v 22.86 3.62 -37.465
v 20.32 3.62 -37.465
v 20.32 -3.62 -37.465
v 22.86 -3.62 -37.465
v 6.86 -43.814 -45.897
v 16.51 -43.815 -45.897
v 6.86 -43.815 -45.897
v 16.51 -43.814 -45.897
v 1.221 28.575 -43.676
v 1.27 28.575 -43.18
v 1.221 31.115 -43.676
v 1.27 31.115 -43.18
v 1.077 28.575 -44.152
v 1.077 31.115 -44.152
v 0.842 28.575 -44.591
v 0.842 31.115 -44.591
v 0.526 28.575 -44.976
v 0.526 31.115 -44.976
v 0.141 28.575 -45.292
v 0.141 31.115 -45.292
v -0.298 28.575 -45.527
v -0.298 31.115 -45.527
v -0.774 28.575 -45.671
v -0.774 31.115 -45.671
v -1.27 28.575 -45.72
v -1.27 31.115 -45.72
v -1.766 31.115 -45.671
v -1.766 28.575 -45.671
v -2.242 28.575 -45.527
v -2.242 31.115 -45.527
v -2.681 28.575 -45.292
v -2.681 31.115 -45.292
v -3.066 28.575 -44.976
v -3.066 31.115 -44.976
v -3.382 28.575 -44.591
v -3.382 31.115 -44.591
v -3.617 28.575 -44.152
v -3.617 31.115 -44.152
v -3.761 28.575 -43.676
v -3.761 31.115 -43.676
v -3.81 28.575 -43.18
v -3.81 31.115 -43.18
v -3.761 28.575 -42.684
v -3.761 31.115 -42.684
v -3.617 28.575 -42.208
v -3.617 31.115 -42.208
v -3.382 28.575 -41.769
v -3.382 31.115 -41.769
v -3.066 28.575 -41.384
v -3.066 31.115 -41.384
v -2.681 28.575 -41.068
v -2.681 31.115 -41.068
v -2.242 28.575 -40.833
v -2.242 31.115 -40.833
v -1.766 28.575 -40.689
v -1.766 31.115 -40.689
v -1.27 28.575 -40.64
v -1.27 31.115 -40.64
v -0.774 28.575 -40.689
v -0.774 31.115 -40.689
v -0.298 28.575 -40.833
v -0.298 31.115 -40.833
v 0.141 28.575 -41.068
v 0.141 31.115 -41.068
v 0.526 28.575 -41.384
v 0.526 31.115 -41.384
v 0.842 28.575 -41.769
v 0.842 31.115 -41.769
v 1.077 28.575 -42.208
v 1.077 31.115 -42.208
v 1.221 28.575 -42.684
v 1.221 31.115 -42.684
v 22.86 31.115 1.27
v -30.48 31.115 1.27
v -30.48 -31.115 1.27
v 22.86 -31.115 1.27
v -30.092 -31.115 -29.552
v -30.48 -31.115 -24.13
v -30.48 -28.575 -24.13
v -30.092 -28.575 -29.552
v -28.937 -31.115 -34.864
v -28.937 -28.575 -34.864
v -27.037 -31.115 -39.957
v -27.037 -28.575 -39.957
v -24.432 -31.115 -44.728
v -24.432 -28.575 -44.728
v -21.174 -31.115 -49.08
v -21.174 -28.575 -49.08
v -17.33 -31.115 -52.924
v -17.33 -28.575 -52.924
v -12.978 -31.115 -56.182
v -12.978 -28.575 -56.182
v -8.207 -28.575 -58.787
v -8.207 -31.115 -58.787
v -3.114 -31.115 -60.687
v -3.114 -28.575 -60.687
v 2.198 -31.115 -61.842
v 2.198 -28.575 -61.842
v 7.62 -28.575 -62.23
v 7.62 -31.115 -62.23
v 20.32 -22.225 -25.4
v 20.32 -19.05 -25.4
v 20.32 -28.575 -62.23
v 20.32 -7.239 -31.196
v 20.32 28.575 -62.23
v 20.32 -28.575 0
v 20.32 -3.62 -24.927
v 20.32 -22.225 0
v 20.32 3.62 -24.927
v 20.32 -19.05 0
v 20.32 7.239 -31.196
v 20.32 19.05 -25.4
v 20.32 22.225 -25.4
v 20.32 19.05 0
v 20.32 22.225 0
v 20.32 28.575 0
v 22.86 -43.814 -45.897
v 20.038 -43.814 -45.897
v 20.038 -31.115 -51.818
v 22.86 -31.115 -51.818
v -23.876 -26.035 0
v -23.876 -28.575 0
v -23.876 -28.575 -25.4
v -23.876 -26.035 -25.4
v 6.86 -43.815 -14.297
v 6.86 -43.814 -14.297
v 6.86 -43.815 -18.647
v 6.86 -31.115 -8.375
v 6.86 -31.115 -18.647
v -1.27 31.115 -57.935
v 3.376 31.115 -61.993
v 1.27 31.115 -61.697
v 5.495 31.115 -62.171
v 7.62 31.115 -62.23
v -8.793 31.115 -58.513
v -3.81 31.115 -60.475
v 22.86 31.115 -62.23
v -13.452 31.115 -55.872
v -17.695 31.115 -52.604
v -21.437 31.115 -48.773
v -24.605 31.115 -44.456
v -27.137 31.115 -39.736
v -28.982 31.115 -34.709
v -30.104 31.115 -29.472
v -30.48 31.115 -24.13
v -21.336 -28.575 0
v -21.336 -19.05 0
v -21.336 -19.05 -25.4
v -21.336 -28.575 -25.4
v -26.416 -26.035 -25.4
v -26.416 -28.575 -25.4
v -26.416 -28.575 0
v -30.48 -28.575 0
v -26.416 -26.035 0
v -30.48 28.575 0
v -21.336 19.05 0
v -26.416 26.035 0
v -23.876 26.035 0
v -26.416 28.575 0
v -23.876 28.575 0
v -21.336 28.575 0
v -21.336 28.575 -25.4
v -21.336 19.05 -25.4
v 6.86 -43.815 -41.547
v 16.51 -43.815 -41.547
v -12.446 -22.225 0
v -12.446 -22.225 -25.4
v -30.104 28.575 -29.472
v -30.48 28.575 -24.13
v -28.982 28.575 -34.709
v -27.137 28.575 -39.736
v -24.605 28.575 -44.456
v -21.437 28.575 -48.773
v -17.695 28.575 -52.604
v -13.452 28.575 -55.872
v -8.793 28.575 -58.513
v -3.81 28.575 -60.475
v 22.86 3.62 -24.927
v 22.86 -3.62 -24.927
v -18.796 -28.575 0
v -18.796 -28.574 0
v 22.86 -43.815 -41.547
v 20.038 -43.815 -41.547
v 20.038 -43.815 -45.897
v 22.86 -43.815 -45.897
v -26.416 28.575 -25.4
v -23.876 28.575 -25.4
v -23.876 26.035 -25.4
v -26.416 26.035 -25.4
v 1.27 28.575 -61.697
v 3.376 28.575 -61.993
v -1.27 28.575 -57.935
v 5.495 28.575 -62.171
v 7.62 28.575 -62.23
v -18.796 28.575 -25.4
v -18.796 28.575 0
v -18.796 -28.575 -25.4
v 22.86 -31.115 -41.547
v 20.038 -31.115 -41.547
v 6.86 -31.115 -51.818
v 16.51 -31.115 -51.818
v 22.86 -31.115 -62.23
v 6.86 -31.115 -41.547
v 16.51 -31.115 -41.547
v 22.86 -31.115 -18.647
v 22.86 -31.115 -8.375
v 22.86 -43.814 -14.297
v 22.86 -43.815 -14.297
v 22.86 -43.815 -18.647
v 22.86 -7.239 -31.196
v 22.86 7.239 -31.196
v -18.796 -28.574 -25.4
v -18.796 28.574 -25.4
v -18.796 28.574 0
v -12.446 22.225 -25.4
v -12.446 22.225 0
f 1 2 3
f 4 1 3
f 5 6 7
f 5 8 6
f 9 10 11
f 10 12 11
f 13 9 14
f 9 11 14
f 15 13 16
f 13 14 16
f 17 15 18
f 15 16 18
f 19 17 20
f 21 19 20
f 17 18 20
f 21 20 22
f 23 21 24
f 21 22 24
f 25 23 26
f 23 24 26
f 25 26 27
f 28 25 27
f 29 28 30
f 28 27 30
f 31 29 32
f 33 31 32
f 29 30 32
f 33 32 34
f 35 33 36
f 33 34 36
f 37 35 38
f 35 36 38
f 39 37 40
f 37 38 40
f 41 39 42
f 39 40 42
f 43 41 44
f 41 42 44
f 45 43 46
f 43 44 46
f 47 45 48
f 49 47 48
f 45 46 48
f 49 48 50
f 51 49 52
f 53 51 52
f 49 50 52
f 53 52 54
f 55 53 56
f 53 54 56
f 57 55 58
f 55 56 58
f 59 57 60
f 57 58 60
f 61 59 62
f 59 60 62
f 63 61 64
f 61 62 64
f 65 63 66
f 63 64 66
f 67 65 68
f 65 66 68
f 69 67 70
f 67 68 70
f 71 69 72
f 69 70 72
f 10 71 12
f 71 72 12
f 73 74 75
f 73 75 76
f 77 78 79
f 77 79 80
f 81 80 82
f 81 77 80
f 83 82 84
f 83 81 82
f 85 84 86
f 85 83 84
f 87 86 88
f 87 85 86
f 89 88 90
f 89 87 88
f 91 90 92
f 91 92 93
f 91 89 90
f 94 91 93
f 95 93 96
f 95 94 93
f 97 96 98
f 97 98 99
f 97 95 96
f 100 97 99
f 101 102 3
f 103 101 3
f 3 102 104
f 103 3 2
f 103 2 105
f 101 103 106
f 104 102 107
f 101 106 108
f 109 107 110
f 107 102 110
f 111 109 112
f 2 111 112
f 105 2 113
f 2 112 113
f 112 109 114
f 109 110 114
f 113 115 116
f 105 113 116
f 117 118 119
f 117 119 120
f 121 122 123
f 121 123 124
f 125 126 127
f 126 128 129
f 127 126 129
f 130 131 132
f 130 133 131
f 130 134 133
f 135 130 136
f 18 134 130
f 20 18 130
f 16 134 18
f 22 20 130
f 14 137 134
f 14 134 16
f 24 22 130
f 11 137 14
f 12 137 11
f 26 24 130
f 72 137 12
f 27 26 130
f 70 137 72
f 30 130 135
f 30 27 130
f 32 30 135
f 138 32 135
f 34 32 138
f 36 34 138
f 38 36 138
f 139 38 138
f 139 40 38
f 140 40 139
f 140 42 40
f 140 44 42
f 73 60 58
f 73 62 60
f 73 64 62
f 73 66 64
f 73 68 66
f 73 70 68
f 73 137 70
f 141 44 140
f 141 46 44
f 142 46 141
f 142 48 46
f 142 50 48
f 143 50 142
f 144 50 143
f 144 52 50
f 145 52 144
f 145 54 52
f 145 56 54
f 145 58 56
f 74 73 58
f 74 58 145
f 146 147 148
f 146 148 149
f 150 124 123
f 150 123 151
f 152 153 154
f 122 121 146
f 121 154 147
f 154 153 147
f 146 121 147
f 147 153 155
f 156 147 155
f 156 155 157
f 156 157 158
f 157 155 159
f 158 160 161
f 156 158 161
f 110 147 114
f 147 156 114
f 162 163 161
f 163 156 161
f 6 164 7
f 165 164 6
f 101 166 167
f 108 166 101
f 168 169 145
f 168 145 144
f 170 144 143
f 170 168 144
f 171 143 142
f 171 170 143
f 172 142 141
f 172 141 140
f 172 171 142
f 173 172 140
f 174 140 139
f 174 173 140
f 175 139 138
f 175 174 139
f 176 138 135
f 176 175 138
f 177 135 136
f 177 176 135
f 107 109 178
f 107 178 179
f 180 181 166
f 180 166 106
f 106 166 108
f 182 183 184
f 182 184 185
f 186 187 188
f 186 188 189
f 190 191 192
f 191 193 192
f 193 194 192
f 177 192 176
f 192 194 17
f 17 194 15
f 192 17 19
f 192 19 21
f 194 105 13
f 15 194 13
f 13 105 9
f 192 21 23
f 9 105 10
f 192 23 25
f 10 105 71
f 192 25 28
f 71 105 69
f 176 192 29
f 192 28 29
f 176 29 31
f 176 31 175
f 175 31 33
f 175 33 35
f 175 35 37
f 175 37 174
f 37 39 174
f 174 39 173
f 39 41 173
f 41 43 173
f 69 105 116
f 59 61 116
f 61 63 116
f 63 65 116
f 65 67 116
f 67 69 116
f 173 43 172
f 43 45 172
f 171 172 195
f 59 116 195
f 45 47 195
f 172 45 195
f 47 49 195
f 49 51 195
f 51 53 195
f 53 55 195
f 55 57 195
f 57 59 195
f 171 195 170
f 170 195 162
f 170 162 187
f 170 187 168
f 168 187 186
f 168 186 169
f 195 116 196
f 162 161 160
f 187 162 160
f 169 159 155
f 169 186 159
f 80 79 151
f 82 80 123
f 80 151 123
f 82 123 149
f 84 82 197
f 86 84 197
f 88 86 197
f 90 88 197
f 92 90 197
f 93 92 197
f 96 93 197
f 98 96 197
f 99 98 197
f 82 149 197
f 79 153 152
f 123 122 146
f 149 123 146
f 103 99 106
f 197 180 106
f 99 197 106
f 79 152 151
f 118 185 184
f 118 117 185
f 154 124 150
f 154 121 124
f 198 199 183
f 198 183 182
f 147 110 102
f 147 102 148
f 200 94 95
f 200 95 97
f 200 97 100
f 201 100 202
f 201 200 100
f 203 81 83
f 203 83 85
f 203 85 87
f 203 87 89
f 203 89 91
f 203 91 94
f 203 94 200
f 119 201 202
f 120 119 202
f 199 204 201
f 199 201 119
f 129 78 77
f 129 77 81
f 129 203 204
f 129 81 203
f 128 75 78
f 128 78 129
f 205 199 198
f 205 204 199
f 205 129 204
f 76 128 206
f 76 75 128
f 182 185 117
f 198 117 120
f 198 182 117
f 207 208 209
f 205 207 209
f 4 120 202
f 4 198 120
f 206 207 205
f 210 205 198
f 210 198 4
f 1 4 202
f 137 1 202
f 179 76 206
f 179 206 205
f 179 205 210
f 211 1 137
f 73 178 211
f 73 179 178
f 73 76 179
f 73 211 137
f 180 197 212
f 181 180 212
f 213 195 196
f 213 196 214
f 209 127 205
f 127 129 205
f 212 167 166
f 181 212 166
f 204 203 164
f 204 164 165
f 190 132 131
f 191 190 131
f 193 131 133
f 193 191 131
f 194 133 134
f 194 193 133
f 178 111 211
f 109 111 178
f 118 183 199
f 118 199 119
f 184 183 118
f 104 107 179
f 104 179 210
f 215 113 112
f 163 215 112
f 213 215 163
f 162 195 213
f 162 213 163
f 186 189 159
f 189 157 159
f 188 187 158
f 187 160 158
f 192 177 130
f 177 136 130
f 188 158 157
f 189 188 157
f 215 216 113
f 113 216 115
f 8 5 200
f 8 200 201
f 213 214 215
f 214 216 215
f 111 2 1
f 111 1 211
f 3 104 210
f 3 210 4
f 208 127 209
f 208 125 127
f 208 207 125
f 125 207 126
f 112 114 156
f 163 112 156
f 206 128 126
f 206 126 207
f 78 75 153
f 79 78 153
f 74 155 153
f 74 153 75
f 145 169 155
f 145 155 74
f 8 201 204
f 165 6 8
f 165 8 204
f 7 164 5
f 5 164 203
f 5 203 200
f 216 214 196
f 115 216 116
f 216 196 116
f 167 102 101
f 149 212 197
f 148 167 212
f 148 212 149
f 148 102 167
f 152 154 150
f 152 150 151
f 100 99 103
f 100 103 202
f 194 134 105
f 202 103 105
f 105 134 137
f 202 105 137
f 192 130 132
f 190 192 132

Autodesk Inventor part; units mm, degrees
ref_plane "YZ Plane" through (0, 0, 0) normal (1, 0, 0) x (0, 1, 0)
ref_plane "XZ Plane" through (0, 0, 0) normal (0, 1, 0) x (-1, 0, 0)
ref_plane "XY Plane" through (0, 0, 0) normal (0, 0, 1) x (1, 0, 0)
sketch "Sketch1" plane through (0, 0, 0) normal (0, 0, 1) x (1, 0, 0)
  line L0 (-30.48, 28.575) -> (20.32, 28.575)
  line L1 (20.32, 28.575) -> (20.32, -28.575)
  line L2 (20.32, -28.575) -> (-30.48, -28.575)
  line L3 (-30.48, -28.575) -> (-30.48, 28.575)
  line L4 (-25.4, 28.575) -> (25.4, -28.575) construction
  line L5 (25.4, 28.575) -> (-25.4, -28.575) construction
  line L6 (0, 0) -> (0, -19.5531)
  dimension "d0" = 50.8
  dimension "d1" = 57.15
  dimension "d2" = 20.32
  dimension "d3" = 0
extrude "Extrusion1" add sketch "Sketch1" along normal blind 1.27
sketch "Sketch2" plane through (0, 0, 1.27) normal (0, 0, 1) x (1, 0, 0)
  line L0 (-30.48, -28.575) -> (20.32, -28.575) projected
  line L1 (20.32, -28.575) -> (20.32, 28.575) projected
  line L2 (20.32, 28.575) -> (-30.48, 28.575) projected
  line L3 (-30.48, 28.575) -> (-30.48, -28.575) projected
  line L4 (20.32, 28.575) -> (-30.48, 28.575) projected
  line L5 (-30.48, -28.575) -> (20.32, -28.575) projected
  line L6 (20.32, 28.575) -> (-30.48, 28.575)
  line L7 (-30.48, 28.575) -> (-30.48, -28.575)
  line L8 (-30.48, -28.575) -> (20.32, -28.575)
  line L9 (20.32, -28.575) -> (20.32, 28.575)
  line L10 (22.86, 31.115) -> (-30.48, 31.115)
  line L11 (-30.48, -31.115) -> (22.86, -31.115)
  line L12 (22.86, -31.115) -> (22.86, 31.115)
  line L13 (-30.48, 31.115) -> (-30.48, 28.575)
  line L14 (-30.48, 28.575) -> (-30.48, -28.575) projected
  line L15 (-30.48, -28.575) -> (-30.48, -31.115)
  point P0 (0, 0)
  point P1 (-30.48, 28.575)
  dimension "d6" = 2.54
  dimension "d7" = 2.54
  dimension "d8" = 2.54
extrude "Extrusion2" add sketch "Sketch2" against normal blind 63.5 contours L0 L1 L2 L13 L10 L12 L11 L15
fillet "Fillet1" radius 38.1 2 edges at (-30.48, -29.845, -62.23) (-30.48, 29.845, -62.23)
sketch "Sketch3" plane through (0, 0, 0) normal (0, 0, -1) x (-1, 0, 0)
  line L0 (30.48, -28.575) -> (-20.32, -28.575) projected
  line L1 (30.48, 28.575) -> (30.48, -28.575) projected
  line L2 (-20.32, 28.575) -> (30.48, 28.575) projected
  line L3 (-20.32, -28.575) -> (-20.32, 28.575) projected
  line L4 (-7.62, -31.115) -> (30.48, -31.115) projected
  line L5 (30.48, -31.115) -> (30.48, -28.575) projected
  line L6 (30.48, -28.575) -> (-7.62, -28.575) projected
  line L7 (-7.62, -28.575) -> (-7.62, -31.115) projected
  line L8 (30.48, 31.115) -> (-7.62, 31.115) projected
  line L9 (-7.62, 31.115) -> (-7.62, 28.575) projected
  line L10 (30.48, 28.575) -> (30.48, 28.575) projected
  line L11 (30.48, 28.575) -> (30.48, 31.115) projected
  line L12 (-20.32, 28.575) -> (30.48, 28.575) projected
  line L13 (30.48, 28.575) -> (30.48, 28.575) projected
  line L14 (30.48, -28.575) -> (-20.32, -28.575) projected
  line L15 (26.416, -28.575) -> (23.876, -28.575)
  line L16 (23.876, -28.575) -> (23.876, -26.035)
  line L17 (23.876, -26.035) -> (26.416, -26.035)
  line L18 (26.416, -26.035) -> (26.416, -28.575)
  line L19 (21.336, -28.575) -> (18.796, -28.575)
  line L20 (18.796, -28.575) -> (18.796, -22.225)
  line L21 (18.796, -22.225) -> (21.336, -22.225)
  line L22 (21.336, -22.225) -> (21.336, -28.575)
  line L23 (-20.32, 28.575) -> (30.48, 28.575) projected
  line L24 (26.416, 28.575) -> (23.876, 28.575)
  line L25 (23.876, 28.575) -> (23.876, 26.035)
  line L26 (23.876, 26.035) -> (26.416, 26.035)
  line L27 (26.416, 26.035) -> (26.416, 28.575)
  line L28 (21.336, 28.575) -> (18.796, 28.575)
  line L29 (18.796, 28.575) -> (18.796, 22.225)
  line L30 (18.796, 22.225) -> (21.336, 22.225)
  line L31 (21.336, 22.225) -> (21.336, 28.575)
  point P0 (0, 0)
  point P1 (30.48, -26.035)
  point P2 (23.876, -28.575)
  point P3 (30.48, 26.035)
  point P4 (23.876, 28.575)
  point P5 (21.336, 28.575)
  point P6 (18.796, 28.575)
  dimension "d12" = 2.54
  dimension "d13" = 2.54
  dimension "d14" = 2.54
  dimension "d15" = 6.35
  dimension "d16" = 2.54
  dimension "d17" = 2.54
  dimension "d18" = 2.54
  dimension "d19" = 2.54
  dimension "d20" = 6.35
  dimension "d21" = 2.54
  dimension "d57" = 6.35
  dimension "d58" = 6.35
  dimension "d59" = 4.064
extrude "Extrusion3" add sketch "Sketch3" along normal blind 25.4 contours L0 L16 L17 L18 | L27 L26 L25 L2 | L0 L20 L21 L22 | L31 L30 L29 L2
sketch "Sketch4" plane through (-30.48, -31.115, 1.27) normal (0, -1, 0) x (1, 0, 0)
  arc A0 (35.54, -42.8168) -> (35.14, -42.4168) centre (35.14, -42.8168) ccw projected
  line L0 (35.54, -42.8168) -> (35.54, -47.1668) projected
  line L1 (35.54, -47.1668) -> (37.14, -47.1668) projected
  line L2 (37.14, -47.1668) -> (37.14, -42.8168) projected
  arc A1 (37.54, -42.4168) -> (37.14, -42.8168) centre (37.54, -42.8168) ccw projected
  line L3 (37.54, -42.4168) -> (53.14, -42.4168) projected
  line L4 (53.14, -42.4168) -> (53.14, -20.3168) projected
  line L5 (53.14, -20.3168) -> (37.54, -20.3168) projected
  arc A2 (37.14, -19.9168) -> (37.54, -20.3168) centre (37.54, -19.9168) ccw projected
  line L6 (37.14, -19.9168) -> (37.14, -15.5668) projected
  line L7 (37.14, -15.5668) -> (35.54, -15.5668) projected
  line L8 (35.54, -15.5668) -> (35.54, -19.9168) projected
  arc A3 (35.14, -20.3168) -> (35.54, -19.9168) centre (35.14, -19.9168) ccw projected
  line L9 (35.14, -20.3168) -> (31.04, -20.3168) projected
  line L10 (31.04, -20.3168) -> (31.04, -35.0805) projected
  spline S0 degree 3 poles (31.04, -35.0805) (31.04, -35.2107) (31.032, -35.3398) (31.0199, -35.4684) (31.0078, -35.597) (30.9913, -35.725) (30.9724, -35.8527) (30.9346, -36.1082) (30.8875, -36.3608) (30.84, -36.6168) knots 0 0 0 0 0.00039 0.00039 0.00039 0.000781 0.000781 0.000781 0.001562 0.001562 0.001562 0.001562 projected
  spline S1 degree 3 poles (30.84, -36.6168) (30.8871, -36.8706) (30.9346, -37.1252) (30.9724, -37.3806) (30.9913, -37.5084) (31.0077, -37.6365) (31.0199, -37.7651) (31.032, -37.8937) (31.04, -38.0228) (31.04, -38.153) knots -0.000015 -0.000015 -0.000015 -0.000015 0.000759 0.000759 0.000759 0.001147 0.001147 0.001147 0.001534 0.001534 0.001534 0.001534 projected
  line L11 (31.04, -38.153) -> (31.04, -42.4168) projected
  line L12 (31.04, -42.4168) -> (35.14, -42.4168) projected
  line L13 (37.34, -42.8168) -> (37.34, -47.1668) projected
  line L14 (37.34, -15.5668) -> (37.34, -19.9168) projected
  line L15 (37.34, -42.8168) -> (53.34, -42.8168)
  line L16 (53.34, -42.8168) -> (53.34, -47.1668)
  line L17 (53.34, -47.1668) -> (37.34, -47.1668)
  line L18 (37.34, -47.1668) -> (37.34, -42.8168)
  line L19 (37.34, -19.9168) -> (53.34, -19.9168)
  line L20 (53.34, -19.9168) -> (53.34, -15.5668)
  line L21 (53.34, -15.5668) -> (37.34, -15.5668)
  line L22 (37.34, -15.5668) -> (37.34, -19.9168)
  line L23 (53.34, 0) -> (53.34, -63.5) projected
  point P0 (30.48, -1.27)
  dimension "d33" = 0
  dimension "d34" = 0
extrude "Extrusion4" add sketch "Sketch4" along normal blind 12.7 contours L15 L16 L17 L13 | L19 L14 L21 L20
sketch "Sketch5" plane through (20.32, -28.575, 0) normal (-1, 0, 0) x (0, 0, 1)
  line L0 (0, 0) -> (0, 57.15) projected
  line L1 (0, 57.15) -> (-62.23, 57.15) projected
  line L2 (-62.23, 0) -> (-62.23, 57.15) projected
  line L3 (0, 0) -> (-62.23, 0) projected
  line L4 (-62.23, 59.69) -> (-62.23, -2.54) projected
  line L5 (-62.23, 28.575) -> (-2.2668, 28.575)
  line L6 (-31.1958, 28.575) -> (-31.115, 57.15)
  line L7 (-31.115, 57.15) -> (-37.465, 57.15)
  line L8 (0, 57.15) -> (-62.23, 57.15) projected
  line L9 (-37.465, 57.15) -> (-37.465, 0)
  line L10 (-62.23, 0) -> (-24.13, 0) projected
  line L11 (-37.465, 32.1945) -> (-31.1958, 35.814)
  line L12 (-31.1958, 35.814) -> (-24.9267, 32.1945)
  line L13 (-24.9267, 32.1945) -> (-24.9267, 24.9555)
  line L14 (-24.9267, 24.9555) -> (-31.1958, 21.336)
  line L15 (-31.1958, 21.336) -> (-37.465, 24.9555)
  line L16 (-37.465, 24.9555) -> (-37.465, 32.1945)
  point P0 (0, 28.575)
  point P1 (-37.465, 28.575)
  point P2 (-37.465, 32.1945)
  point P3 (-37.465, 24.9555)
  dimension "d28" = 57.15
  dimension "d30" = 6.35
  dimension "d67" = 7.239
extrude "Extrusion5" cut sketch "Sketch5" against normal blind 2.54 contours L12 L13 L5 L6 | L6 L5 L9 L11 L12 | L9 L5 L13 L14 L15
sketch "Sketch6" plane through (-30.48, 31.115, 1.27) normal (0, 1, 0) x (1, 0, 0)
  circle A0 centre (29.21, 44.45) radius 2.54
  line L0 (53.34, 0) -> (53.34, 63.5) projected
  line L1 (53.34, 0) -> (0, 0) projected
  point P0 (30.48, 1.27)
  dimension "d38" = 5.08
  dimension "d41" = 24.13
  dimension "d42" = 44.45
extrude "Extrusion6" cut sketch "Sketch6" against normal blind 2.54
chamfer "Chamfer3" distance 12.7 angle 25 1 edges at (14.86, -31.115, -45.8968) measured on face at (17.5267, -39.5817, -45.8968)
chamfer "Chamfer4" distance 12.7 angle 25 1 edges at (14.86, -31.115, -14.2968) measured on face at (17.5267, -39.5817, -14.2968)
sketch "Sketch8" plane through (-30.48, -43.815, 1.27) normal (0, -1, 0) x (1, 0, 0)
  line L0 (53.34, -42.8168) -> (37.34, -42.8168) projected
  line L1 (50.5178, -53.0889) -> (46.99, -53.0889)
  line L2 (46.99, -53.0889) -> (46.99, -42.8168)
  line L3 (46.99, -42.8168) -> (50.5178, -42.8168)
  line L4 (50.5178, -42.8168) -> (50.5178, -53.0889)
  line L5 (37.34, -53.0889) -> (53.34, -53.0889) projected
  line L6 (53.34, -53.0889) -> (53.34, -47.1668) projected
  point P0 (30.48, -1.27)
  dimension "d52" = 2.8222
  dimension "d53" = 6.35
extrude "Extrusion7" cut sketch "Sketch8" against normal blind 12.7
sketch "Sketch9" plane through (0, 0, 0) normal (0, 0, -1) x (-1, 0, 0)
  line L0 (18.796, -22.225) -> (21.336, -22.225) projected
  line L1 (21.336, -22.225) -> (21.336, -28.575) projected
  line L2 (23.876, -28.575) -> (21.336, -28.575) projected
  line L3 (23.876, -28.575) -> (23.876, -26.035) projected
  line L4 (23.876, -26.035) -> (26.416, -26.035) projected
  line L5 (26.416, -26.035) -> (26.416, -28.575) projected
  line L6 (30.48, -28.575) -> (26.416, -28.575) projected
  line L7 (30.48, 28.575) -> (30.48, -28.575) projected
  line L8 (26.416, 28.575) -> (30.48, 28.575) projected
  line L9 (26.416, 28.575) -> (26.416, 26.035) projected
  line L10 (26.416, 26.035) -> (23.876, 26.035) projected
  line L11 (23.876, 26.035) -> (23.876, 28.575) projected
  line L12 (21.336, 28.575) -> (23.876, 28.575) projected
  line L13 (21.336, 28.575) -> (21.336, 22.225) projected
  line L14 (21.336, 22.225) -> (18.796, 22.225) projected
  line L15 (-20.32, 28.575) -> (18.796, 28.575) projected
  line L16 (-20.32, -28.575) -> (-20.32, 28.575) projected
  line L17 (18.796, -28.575) -> (-20.32, -28.575) projected
  line L18 (18.796, -28.575) -> (18.796, -22.225) projected
  line L19 (18.796, 22.225) -> (18.796, 28.575) projected
  line L20 (-20.32, -28.575) -> (-20.32, 28.575) projected
  line L21 (21.336, -22.225) -> (-20.32, -22.225)
  line L22 (-20.32, -22.225) -> (-20.32, -19.05)
  line L23 (-20.32, -19.05) -> (21.336, -19.05)
  line L24 (21.336, -19.05) -> (21.336, -22.225)
  line L25 (21.336, 22.225) -> (-20.32, 22.225)
  line L26 (-20.32, 22.225) -> (-20.32, 19.05)
  line L27 (-20.32, 19.05) -> (21.336, 19.05)
  line L28 (21.336, 19.05) -> (21.336, 22.225)
  point P0 (0, 0)
  point P1 (-20.32, -22.225)
  dimension "d56" = 6.35
  dimension "d60" = 3.175
  dimension "d61" = 3.175
extrude "Extrusion8" add sketch "Sketch9" along normal blind 25.4 contours L21 L16 L23 L24 L0 | L16 L25 L14 L28 L27
chamfer "Chamfer5" distance 6.35 angle 45 2 edges at (-18.796, -22.225, -12.7) (-18.796, 22.225, -12.7)
sketch "Sketch10" plane through (-30.48, 31.115, 1.27) normal (0, 1, 0) x (1, 0, 0)
  circle A0 centre (29.21, 44.45) radius 2.54 projected
  arc A1 (38.1, 63.5) -> (0, 25.4) centre (38.1, 25.4) ccw projected
  line L0 (0, 0) -> (0, 25.4) projected
  line L1 (53.34, 0) -> (0, 0) projected
  line L2 (53.34, 0) -> (53.34, 63.5) projected
  line L3 (38.1, 63.5) -> (53.34, 63.5) projected
  arc A2 (38.1, 63.5) -> (0, 25.4) centre (38.1, 25.4) ccw projected
  line L4 (26.67, 61.7451) -> (29.21, 59.2051)
  line L5 (26.67, 61.7451) -> (30.2621, 61.7451) construction
  line L6 (29.21, 59.2051) -> (31.75, 62.9671)
  arc A3 (31.75, 62.9671) -> (26.67, 61.7451) centre (38.1, 25.4) ccw
  point P0 (30.48, 1.27)
  dimension "d68" = 45
extrude "Extrusion9" cut sketch "Sketch10" against normal blind 2.54 contours L6 L4 A1
properties part number "Base_3DPrint"
